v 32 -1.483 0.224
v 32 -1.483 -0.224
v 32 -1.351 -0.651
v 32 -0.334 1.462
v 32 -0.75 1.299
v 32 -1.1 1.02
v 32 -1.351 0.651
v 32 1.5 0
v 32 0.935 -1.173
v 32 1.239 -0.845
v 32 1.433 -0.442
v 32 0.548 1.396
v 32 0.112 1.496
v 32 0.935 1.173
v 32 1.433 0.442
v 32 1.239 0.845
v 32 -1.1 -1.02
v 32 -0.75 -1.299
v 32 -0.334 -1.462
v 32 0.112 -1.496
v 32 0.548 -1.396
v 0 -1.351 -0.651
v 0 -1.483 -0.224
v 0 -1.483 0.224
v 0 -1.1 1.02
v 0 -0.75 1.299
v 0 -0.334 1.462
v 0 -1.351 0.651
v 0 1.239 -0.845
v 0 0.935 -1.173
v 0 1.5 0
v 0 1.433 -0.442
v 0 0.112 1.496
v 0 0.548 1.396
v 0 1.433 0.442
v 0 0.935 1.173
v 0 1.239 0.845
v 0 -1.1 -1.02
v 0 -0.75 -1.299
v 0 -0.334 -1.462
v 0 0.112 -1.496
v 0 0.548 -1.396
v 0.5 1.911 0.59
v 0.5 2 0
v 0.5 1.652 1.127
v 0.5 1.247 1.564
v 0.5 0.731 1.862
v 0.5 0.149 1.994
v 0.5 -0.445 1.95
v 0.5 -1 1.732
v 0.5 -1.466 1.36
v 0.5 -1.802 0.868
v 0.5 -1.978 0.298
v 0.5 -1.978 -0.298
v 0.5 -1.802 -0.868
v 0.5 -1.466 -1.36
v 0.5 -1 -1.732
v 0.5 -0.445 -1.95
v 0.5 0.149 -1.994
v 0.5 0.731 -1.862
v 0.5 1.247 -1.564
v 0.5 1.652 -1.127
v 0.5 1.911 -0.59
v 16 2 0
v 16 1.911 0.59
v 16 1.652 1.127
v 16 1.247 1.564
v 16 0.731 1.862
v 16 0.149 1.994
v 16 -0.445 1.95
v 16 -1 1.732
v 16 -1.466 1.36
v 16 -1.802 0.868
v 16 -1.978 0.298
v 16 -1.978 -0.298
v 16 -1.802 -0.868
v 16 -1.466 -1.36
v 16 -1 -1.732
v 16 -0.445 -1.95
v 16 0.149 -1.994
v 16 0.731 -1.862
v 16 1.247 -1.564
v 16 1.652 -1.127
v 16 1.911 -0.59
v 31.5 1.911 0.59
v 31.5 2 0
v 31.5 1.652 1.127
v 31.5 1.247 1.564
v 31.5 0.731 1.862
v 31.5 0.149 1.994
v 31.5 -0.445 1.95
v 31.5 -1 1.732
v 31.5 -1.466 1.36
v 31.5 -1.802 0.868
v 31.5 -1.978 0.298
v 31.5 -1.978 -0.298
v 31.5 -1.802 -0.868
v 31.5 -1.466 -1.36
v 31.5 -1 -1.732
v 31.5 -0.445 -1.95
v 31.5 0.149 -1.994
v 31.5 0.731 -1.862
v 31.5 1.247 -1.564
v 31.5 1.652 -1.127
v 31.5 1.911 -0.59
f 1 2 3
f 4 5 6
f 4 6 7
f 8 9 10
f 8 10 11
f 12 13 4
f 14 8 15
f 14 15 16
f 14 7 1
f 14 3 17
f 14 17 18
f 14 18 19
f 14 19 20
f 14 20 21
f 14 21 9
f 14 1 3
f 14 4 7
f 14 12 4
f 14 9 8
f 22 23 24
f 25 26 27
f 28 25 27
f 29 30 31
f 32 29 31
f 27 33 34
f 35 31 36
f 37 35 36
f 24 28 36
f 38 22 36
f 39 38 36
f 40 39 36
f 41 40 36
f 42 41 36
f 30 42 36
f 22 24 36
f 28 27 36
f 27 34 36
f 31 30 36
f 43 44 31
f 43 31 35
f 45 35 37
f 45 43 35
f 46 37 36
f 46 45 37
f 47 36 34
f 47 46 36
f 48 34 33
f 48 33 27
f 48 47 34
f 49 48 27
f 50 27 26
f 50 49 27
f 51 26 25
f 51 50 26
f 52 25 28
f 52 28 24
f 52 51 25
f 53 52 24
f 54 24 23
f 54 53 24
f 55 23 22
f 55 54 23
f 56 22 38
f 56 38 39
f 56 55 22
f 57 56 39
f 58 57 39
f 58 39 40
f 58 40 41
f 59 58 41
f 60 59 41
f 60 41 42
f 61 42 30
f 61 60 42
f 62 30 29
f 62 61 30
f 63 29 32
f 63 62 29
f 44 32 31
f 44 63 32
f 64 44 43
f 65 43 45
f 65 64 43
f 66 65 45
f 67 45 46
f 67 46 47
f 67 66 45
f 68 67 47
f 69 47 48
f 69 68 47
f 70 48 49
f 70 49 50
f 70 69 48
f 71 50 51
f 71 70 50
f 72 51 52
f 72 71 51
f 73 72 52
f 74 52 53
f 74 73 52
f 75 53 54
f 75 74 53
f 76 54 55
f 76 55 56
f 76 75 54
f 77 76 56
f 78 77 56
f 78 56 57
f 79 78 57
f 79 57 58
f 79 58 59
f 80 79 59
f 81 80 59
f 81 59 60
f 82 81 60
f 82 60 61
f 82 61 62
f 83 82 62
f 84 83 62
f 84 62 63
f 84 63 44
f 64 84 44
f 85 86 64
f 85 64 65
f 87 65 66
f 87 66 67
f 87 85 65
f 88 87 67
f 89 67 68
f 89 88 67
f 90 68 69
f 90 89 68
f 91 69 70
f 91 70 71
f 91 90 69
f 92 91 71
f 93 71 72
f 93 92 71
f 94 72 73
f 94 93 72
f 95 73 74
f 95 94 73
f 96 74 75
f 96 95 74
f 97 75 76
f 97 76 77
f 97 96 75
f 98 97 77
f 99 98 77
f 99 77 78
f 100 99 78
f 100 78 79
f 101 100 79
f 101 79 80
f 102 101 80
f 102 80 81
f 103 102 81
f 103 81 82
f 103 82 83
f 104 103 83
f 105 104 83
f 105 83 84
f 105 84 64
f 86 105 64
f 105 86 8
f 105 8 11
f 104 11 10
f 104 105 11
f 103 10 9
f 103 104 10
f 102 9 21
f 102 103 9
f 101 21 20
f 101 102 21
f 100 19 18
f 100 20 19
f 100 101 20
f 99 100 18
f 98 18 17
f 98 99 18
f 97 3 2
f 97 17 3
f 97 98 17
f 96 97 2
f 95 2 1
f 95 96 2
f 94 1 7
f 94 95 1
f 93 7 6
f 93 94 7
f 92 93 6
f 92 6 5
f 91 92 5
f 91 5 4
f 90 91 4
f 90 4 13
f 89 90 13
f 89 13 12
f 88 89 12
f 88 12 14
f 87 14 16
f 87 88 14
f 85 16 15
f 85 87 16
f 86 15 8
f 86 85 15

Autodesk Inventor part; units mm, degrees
ref_plane "Startebene" through (0, 0, 0) normal (1, 0, 0) x (0, 1, 0)
ref_plane "XZ Plane" through (0, 0, 0) normal (0, 1, 0) x (-1, 0, 0)
ref_plane "XY Plane" through (0, 0, 0) normal (0, 0, 1) x (1, 0, 0)
sketch "Hauptskizze" plane through (0, 0, 0) normal (0, 0, 1) x (1, 0, 0)
  line L0 (0, 0) -> (32, 0)
  line L1 (0, 0) -> (0, 2)
  line L2 (0, 2) -> (16, 2)
  line L3 (32, 2) -> (32, 0)
  line L4 (16, 2) -> (32, 2)
  dimension "d3" = 4
  dimension "d5" = 4
revolve "Umdrehung1" add sketch "Hauptskizze" angle 360 about axis through (0, 0, 0) along (1, 0, 0)
chamfer "Fase3" distance 0.5 angle 45 1 edges at (0, -2, 0) measured on face at (10.6667, 1.9741, -0.3208)
chamfer "Fase2" distance 0.5 angle 45 1 edges at (32, -2, 0) measured on face at (26.6667, 1.9935, -0.1609)
properties part number "Welle" material "Steel"
